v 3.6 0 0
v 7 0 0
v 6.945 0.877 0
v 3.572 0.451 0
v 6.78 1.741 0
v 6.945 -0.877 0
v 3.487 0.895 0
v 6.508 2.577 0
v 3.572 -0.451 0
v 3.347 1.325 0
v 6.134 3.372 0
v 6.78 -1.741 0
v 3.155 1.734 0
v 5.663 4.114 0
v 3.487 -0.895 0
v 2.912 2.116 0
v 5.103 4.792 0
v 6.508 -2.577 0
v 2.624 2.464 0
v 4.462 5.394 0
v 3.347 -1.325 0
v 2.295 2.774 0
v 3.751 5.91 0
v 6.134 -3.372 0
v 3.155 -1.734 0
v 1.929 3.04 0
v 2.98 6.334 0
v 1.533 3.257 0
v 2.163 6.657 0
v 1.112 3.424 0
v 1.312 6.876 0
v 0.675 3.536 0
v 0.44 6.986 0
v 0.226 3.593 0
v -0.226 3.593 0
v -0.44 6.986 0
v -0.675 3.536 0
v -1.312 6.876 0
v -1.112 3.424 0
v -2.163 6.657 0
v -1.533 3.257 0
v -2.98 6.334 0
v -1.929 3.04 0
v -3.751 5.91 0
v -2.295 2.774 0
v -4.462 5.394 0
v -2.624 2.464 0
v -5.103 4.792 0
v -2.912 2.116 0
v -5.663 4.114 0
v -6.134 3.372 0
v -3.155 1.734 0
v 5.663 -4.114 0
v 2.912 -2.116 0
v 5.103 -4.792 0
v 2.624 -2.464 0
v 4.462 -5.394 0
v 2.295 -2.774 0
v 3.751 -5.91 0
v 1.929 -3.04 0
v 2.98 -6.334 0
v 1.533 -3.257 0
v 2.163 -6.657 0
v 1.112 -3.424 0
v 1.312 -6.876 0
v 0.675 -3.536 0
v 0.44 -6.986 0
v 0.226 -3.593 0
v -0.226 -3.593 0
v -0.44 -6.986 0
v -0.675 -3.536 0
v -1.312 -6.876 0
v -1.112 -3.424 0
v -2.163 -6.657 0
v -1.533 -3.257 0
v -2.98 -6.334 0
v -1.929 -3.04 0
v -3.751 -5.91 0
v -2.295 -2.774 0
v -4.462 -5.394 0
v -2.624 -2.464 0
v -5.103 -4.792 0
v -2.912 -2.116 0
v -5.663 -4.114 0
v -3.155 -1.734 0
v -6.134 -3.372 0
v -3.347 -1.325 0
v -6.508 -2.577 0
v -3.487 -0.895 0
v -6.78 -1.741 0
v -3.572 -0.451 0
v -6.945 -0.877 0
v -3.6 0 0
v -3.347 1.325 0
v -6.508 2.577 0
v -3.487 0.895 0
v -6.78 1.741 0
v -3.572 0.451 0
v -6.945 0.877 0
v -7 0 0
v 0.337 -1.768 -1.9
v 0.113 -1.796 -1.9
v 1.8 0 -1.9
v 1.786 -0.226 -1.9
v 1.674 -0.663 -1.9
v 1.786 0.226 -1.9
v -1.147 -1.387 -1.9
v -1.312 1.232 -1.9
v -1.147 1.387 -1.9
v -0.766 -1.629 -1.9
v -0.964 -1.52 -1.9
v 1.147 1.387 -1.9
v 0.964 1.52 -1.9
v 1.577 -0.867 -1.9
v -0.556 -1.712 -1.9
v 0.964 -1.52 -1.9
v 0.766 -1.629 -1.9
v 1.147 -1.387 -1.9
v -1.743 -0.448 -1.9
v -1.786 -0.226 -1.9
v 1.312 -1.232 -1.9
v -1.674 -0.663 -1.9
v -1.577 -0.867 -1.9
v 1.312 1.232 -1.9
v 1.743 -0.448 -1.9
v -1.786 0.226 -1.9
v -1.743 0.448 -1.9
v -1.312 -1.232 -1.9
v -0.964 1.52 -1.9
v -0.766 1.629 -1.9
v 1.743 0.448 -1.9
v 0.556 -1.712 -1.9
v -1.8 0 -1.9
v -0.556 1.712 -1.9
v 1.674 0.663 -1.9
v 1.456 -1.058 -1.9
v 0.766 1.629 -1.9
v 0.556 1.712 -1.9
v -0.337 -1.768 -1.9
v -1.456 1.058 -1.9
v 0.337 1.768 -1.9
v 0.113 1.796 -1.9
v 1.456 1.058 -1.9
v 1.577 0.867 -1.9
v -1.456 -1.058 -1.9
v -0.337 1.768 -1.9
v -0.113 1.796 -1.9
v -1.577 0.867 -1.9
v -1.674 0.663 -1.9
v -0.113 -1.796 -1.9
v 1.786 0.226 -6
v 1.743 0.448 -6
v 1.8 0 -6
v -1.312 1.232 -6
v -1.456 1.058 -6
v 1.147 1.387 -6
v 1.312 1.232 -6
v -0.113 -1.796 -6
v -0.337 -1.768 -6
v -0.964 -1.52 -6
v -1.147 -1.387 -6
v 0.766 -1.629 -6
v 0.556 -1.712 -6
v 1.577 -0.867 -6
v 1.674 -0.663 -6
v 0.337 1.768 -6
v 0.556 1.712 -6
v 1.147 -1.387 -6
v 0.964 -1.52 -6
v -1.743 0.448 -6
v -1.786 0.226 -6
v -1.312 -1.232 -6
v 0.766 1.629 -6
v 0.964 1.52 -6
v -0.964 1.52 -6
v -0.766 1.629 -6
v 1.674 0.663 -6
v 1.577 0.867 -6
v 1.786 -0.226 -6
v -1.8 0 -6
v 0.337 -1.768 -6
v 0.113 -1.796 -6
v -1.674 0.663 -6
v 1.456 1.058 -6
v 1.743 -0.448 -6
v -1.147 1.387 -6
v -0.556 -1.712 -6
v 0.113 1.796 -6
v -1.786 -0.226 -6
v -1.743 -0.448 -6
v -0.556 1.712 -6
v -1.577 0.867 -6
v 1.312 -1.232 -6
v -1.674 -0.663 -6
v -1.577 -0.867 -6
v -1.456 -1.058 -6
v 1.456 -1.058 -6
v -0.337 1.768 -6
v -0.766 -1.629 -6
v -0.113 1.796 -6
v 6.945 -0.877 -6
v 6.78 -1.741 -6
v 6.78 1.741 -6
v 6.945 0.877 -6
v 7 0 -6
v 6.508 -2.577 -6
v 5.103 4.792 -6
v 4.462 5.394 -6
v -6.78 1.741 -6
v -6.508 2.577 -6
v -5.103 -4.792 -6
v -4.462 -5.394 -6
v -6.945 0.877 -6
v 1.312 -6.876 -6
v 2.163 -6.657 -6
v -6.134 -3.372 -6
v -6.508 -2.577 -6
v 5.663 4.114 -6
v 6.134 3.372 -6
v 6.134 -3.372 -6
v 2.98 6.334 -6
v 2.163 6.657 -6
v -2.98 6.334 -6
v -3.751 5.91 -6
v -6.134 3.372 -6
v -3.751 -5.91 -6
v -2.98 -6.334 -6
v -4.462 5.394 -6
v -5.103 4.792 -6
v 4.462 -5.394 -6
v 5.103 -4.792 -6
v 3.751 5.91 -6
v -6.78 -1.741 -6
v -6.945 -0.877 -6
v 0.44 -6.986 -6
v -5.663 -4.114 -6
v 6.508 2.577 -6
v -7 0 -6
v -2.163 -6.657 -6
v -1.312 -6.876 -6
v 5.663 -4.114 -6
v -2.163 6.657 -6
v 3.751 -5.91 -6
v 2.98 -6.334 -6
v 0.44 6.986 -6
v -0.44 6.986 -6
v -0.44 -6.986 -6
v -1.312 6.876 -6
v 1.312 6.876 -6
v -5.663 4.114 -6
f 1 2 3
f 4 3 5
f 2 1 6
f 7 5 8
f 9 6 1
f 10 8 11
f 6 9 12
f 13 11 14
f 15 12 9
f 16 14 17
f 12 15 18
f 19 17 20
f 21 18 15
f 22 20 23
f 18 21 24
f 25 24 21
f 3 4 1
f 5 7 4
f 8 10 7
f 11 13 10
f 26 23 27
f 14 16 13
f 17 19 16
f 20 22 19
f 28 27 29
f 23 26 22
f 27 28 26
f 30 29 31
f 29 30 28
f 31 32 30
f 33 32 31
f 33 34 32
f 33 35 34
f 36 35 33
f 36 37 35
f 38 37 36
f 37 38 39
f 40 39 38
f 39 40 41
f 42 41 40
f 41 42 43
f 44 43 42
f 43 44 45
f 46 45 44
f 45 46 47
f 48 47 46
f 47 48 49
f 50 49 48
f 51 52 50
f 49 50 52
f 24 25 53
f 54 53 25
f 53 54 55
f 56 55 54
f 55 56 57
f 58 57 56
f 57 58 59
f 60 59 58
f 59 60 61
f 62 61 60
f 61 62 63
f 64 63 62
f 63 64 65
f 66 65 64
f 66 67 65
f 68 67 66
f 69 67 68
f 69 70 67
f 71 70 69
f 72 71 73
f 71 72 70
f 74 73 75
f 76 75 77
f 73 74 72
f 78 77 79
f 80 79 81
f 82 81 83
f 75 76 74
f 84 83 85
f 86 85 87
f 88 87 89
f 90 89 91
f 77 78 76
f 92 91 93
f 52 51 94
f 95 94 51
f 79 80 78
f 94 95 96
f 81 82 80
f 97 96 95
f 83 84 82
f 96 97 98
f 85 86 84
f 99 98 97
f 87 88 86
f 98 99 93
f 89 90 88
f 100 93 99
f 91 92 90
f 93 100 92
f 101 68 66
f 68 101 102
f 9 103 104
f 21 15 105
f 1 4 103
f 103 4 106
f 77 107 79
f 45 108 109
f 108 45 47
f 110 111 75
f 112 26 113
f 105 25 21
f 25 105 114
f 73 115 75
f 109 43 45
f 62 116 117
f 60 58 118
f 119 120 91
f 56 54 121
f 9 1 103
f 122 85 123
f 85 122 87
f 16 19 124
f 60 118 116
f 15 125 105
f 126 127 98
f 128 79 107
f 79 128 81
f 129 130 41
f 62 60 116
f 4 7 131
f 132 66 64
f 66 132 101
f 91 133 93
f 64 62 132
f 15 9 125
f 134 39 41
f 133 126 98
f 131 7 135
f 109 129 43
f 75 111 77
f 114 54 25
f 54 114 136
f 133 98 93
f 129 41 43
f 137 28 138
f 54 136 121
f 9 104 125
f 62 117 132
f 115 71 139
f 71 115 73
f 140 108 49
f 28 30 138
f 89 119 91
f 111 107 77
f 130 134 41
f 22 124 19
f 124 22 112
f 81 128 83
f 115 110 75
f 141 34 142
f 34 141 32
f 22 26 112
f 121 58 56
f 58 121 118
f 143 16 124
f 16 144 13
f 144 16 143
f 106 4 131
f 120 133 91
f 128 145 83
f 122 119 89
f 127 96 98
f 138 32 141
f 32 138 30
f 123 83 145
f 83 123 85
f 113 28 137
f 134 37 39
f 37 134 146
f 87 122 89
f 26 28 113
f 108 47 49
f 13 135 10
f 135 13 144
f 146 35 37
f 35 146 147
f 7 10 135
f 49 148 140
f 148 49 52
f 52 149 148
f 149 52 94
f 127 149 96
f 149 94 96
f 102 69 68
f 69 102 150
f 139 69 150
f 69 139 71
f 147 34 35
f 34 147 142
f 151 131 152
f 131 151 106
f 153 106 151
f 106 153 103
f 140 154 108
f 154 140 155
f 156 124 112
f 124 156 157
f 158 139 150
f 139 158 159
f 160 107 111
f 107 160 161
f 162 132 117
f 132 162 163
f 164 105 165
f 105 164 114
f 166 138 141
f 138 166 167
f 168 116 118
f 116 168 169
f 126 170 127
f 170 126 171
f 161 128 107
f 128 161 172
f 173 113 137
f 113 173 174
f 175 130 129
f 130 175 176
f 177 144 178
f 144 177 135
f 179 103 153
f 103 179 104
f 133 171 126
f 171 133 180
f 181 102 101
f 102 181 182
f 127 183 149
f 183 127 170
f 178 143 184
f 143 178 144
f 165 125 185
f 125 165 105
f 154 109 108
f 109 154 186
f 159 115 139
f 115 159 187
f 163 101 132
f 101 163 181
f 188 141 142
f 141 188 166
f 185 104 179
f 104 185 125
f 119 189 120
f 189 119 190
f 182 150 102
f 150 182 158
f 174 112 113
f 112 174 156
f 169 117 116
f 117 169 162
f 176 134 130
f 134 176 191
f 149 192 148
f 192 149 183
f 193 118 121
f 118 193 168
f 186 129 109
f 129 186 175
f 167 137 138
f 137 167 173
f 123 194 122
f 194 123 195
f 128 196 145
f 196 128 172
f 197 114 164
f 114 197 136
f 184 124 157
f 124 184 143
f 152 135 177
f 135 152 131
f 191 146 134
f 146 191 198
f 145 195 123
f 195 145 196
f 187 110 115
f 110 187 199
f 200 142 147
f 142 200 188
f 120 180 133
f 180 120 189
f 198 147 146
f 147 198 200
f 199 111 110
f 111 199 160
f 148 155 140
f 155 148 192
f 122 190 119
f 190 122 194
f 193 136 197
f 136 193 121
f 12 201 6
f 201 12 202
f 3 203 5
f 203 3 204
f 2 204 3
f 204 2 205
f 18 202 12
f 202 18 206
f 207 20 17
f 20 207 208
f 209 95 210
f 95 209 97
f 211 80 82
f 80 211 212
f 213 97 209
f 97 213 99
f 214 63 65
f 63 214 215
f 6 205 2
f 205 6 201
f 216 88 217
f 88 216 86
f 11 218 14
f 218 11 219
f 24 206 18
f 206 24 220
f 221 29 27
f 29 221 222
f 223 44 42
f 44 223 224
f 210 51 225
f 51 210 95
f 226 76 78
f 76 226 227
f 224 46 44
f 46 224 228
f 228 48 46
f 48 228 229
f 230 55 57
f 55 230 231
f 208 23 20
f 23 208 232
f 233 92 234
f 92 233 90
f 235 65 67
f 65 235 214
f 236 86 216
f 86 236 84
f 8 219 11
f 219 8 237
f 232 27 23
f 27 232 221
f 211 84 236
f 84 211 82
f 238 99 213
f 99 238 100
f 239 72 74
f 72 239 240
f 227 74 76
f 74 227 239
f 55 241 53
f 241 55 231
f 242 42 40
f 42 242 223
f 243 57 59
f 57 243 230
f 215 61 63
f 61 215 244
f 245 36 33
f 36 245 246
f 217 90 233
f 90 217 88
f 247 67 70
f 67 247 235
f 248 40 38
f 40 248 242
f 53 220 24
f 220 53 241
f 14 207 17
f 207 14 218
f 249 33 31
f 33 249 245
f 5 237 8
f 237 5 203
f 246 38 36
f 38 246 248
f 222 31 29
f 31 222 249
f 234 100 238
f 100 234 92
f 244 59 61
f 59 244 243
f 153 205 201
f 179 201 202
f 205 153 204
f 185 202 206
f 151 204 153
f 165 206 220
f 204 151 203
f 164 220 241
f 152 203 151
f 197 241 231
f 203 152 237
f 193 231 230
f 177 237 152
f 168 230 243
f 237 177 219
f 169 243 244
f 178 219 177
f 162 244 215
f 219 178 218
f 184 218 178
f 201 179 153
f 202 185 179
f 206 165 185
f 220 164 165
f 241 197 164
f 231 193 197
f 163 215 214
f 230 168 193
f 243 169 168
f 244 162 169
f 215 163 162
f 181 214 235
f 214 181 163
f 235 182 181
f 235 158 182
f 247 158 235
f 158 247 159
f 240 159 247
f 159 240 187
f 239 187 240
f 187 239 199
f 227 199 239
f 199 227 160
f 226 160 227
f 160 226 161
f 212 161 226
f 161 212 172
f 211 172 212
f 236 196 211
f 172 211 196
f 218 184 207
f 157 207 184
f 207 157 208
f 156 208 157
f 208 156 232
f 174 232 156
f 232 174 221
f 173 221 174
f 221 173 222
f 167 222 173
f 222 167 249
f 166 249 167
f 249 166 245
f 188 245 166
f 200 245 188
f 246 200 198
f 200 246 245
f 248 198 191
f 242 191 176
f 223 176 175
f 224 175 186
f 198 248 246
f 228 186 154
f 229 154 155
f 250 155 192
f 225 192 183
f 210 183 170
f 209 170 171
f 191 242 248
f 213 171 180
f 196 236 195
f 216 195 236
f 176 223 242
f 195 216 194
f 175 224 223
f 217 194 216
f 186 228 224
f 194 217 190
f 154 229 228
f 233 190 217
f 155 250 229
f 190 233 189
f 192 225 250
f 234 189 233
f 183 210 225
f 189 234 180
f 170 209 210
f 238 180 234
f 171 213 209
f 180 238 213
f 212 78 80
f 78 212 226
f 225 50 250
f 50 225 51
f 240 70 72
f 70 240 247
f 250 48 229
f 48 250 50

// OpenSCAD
$fn = 50;

difference() {
	union() {
		translate(v = [0, 0, -6.0]) {
			cylinder(h = 6, r = 7.0);
		}
	}
	union() {
		translate(v = [0, 0, 0]) {
			rotate(a = [0, 0, 0]) {
				difference() {
					union() {
						translate(v = [0, 0, -9.0]) {
							cylinder(h = 9, r = 1.5);
						}
						translate(v = [0, 0, -1.9]) {
							cylinder(h = 1.9, r1 = 1.8, r2 = 3.6);
						}
						translate(v = [0, 0, -9.0]) {
							cylinder(h = 9, r = 1.8);
						}
						translate(v = [0, 0, -9.0]) {
							cylinder(h = 9, r = 1.5);
						}
					}
					union();
				}
			}
		}
	}
}
